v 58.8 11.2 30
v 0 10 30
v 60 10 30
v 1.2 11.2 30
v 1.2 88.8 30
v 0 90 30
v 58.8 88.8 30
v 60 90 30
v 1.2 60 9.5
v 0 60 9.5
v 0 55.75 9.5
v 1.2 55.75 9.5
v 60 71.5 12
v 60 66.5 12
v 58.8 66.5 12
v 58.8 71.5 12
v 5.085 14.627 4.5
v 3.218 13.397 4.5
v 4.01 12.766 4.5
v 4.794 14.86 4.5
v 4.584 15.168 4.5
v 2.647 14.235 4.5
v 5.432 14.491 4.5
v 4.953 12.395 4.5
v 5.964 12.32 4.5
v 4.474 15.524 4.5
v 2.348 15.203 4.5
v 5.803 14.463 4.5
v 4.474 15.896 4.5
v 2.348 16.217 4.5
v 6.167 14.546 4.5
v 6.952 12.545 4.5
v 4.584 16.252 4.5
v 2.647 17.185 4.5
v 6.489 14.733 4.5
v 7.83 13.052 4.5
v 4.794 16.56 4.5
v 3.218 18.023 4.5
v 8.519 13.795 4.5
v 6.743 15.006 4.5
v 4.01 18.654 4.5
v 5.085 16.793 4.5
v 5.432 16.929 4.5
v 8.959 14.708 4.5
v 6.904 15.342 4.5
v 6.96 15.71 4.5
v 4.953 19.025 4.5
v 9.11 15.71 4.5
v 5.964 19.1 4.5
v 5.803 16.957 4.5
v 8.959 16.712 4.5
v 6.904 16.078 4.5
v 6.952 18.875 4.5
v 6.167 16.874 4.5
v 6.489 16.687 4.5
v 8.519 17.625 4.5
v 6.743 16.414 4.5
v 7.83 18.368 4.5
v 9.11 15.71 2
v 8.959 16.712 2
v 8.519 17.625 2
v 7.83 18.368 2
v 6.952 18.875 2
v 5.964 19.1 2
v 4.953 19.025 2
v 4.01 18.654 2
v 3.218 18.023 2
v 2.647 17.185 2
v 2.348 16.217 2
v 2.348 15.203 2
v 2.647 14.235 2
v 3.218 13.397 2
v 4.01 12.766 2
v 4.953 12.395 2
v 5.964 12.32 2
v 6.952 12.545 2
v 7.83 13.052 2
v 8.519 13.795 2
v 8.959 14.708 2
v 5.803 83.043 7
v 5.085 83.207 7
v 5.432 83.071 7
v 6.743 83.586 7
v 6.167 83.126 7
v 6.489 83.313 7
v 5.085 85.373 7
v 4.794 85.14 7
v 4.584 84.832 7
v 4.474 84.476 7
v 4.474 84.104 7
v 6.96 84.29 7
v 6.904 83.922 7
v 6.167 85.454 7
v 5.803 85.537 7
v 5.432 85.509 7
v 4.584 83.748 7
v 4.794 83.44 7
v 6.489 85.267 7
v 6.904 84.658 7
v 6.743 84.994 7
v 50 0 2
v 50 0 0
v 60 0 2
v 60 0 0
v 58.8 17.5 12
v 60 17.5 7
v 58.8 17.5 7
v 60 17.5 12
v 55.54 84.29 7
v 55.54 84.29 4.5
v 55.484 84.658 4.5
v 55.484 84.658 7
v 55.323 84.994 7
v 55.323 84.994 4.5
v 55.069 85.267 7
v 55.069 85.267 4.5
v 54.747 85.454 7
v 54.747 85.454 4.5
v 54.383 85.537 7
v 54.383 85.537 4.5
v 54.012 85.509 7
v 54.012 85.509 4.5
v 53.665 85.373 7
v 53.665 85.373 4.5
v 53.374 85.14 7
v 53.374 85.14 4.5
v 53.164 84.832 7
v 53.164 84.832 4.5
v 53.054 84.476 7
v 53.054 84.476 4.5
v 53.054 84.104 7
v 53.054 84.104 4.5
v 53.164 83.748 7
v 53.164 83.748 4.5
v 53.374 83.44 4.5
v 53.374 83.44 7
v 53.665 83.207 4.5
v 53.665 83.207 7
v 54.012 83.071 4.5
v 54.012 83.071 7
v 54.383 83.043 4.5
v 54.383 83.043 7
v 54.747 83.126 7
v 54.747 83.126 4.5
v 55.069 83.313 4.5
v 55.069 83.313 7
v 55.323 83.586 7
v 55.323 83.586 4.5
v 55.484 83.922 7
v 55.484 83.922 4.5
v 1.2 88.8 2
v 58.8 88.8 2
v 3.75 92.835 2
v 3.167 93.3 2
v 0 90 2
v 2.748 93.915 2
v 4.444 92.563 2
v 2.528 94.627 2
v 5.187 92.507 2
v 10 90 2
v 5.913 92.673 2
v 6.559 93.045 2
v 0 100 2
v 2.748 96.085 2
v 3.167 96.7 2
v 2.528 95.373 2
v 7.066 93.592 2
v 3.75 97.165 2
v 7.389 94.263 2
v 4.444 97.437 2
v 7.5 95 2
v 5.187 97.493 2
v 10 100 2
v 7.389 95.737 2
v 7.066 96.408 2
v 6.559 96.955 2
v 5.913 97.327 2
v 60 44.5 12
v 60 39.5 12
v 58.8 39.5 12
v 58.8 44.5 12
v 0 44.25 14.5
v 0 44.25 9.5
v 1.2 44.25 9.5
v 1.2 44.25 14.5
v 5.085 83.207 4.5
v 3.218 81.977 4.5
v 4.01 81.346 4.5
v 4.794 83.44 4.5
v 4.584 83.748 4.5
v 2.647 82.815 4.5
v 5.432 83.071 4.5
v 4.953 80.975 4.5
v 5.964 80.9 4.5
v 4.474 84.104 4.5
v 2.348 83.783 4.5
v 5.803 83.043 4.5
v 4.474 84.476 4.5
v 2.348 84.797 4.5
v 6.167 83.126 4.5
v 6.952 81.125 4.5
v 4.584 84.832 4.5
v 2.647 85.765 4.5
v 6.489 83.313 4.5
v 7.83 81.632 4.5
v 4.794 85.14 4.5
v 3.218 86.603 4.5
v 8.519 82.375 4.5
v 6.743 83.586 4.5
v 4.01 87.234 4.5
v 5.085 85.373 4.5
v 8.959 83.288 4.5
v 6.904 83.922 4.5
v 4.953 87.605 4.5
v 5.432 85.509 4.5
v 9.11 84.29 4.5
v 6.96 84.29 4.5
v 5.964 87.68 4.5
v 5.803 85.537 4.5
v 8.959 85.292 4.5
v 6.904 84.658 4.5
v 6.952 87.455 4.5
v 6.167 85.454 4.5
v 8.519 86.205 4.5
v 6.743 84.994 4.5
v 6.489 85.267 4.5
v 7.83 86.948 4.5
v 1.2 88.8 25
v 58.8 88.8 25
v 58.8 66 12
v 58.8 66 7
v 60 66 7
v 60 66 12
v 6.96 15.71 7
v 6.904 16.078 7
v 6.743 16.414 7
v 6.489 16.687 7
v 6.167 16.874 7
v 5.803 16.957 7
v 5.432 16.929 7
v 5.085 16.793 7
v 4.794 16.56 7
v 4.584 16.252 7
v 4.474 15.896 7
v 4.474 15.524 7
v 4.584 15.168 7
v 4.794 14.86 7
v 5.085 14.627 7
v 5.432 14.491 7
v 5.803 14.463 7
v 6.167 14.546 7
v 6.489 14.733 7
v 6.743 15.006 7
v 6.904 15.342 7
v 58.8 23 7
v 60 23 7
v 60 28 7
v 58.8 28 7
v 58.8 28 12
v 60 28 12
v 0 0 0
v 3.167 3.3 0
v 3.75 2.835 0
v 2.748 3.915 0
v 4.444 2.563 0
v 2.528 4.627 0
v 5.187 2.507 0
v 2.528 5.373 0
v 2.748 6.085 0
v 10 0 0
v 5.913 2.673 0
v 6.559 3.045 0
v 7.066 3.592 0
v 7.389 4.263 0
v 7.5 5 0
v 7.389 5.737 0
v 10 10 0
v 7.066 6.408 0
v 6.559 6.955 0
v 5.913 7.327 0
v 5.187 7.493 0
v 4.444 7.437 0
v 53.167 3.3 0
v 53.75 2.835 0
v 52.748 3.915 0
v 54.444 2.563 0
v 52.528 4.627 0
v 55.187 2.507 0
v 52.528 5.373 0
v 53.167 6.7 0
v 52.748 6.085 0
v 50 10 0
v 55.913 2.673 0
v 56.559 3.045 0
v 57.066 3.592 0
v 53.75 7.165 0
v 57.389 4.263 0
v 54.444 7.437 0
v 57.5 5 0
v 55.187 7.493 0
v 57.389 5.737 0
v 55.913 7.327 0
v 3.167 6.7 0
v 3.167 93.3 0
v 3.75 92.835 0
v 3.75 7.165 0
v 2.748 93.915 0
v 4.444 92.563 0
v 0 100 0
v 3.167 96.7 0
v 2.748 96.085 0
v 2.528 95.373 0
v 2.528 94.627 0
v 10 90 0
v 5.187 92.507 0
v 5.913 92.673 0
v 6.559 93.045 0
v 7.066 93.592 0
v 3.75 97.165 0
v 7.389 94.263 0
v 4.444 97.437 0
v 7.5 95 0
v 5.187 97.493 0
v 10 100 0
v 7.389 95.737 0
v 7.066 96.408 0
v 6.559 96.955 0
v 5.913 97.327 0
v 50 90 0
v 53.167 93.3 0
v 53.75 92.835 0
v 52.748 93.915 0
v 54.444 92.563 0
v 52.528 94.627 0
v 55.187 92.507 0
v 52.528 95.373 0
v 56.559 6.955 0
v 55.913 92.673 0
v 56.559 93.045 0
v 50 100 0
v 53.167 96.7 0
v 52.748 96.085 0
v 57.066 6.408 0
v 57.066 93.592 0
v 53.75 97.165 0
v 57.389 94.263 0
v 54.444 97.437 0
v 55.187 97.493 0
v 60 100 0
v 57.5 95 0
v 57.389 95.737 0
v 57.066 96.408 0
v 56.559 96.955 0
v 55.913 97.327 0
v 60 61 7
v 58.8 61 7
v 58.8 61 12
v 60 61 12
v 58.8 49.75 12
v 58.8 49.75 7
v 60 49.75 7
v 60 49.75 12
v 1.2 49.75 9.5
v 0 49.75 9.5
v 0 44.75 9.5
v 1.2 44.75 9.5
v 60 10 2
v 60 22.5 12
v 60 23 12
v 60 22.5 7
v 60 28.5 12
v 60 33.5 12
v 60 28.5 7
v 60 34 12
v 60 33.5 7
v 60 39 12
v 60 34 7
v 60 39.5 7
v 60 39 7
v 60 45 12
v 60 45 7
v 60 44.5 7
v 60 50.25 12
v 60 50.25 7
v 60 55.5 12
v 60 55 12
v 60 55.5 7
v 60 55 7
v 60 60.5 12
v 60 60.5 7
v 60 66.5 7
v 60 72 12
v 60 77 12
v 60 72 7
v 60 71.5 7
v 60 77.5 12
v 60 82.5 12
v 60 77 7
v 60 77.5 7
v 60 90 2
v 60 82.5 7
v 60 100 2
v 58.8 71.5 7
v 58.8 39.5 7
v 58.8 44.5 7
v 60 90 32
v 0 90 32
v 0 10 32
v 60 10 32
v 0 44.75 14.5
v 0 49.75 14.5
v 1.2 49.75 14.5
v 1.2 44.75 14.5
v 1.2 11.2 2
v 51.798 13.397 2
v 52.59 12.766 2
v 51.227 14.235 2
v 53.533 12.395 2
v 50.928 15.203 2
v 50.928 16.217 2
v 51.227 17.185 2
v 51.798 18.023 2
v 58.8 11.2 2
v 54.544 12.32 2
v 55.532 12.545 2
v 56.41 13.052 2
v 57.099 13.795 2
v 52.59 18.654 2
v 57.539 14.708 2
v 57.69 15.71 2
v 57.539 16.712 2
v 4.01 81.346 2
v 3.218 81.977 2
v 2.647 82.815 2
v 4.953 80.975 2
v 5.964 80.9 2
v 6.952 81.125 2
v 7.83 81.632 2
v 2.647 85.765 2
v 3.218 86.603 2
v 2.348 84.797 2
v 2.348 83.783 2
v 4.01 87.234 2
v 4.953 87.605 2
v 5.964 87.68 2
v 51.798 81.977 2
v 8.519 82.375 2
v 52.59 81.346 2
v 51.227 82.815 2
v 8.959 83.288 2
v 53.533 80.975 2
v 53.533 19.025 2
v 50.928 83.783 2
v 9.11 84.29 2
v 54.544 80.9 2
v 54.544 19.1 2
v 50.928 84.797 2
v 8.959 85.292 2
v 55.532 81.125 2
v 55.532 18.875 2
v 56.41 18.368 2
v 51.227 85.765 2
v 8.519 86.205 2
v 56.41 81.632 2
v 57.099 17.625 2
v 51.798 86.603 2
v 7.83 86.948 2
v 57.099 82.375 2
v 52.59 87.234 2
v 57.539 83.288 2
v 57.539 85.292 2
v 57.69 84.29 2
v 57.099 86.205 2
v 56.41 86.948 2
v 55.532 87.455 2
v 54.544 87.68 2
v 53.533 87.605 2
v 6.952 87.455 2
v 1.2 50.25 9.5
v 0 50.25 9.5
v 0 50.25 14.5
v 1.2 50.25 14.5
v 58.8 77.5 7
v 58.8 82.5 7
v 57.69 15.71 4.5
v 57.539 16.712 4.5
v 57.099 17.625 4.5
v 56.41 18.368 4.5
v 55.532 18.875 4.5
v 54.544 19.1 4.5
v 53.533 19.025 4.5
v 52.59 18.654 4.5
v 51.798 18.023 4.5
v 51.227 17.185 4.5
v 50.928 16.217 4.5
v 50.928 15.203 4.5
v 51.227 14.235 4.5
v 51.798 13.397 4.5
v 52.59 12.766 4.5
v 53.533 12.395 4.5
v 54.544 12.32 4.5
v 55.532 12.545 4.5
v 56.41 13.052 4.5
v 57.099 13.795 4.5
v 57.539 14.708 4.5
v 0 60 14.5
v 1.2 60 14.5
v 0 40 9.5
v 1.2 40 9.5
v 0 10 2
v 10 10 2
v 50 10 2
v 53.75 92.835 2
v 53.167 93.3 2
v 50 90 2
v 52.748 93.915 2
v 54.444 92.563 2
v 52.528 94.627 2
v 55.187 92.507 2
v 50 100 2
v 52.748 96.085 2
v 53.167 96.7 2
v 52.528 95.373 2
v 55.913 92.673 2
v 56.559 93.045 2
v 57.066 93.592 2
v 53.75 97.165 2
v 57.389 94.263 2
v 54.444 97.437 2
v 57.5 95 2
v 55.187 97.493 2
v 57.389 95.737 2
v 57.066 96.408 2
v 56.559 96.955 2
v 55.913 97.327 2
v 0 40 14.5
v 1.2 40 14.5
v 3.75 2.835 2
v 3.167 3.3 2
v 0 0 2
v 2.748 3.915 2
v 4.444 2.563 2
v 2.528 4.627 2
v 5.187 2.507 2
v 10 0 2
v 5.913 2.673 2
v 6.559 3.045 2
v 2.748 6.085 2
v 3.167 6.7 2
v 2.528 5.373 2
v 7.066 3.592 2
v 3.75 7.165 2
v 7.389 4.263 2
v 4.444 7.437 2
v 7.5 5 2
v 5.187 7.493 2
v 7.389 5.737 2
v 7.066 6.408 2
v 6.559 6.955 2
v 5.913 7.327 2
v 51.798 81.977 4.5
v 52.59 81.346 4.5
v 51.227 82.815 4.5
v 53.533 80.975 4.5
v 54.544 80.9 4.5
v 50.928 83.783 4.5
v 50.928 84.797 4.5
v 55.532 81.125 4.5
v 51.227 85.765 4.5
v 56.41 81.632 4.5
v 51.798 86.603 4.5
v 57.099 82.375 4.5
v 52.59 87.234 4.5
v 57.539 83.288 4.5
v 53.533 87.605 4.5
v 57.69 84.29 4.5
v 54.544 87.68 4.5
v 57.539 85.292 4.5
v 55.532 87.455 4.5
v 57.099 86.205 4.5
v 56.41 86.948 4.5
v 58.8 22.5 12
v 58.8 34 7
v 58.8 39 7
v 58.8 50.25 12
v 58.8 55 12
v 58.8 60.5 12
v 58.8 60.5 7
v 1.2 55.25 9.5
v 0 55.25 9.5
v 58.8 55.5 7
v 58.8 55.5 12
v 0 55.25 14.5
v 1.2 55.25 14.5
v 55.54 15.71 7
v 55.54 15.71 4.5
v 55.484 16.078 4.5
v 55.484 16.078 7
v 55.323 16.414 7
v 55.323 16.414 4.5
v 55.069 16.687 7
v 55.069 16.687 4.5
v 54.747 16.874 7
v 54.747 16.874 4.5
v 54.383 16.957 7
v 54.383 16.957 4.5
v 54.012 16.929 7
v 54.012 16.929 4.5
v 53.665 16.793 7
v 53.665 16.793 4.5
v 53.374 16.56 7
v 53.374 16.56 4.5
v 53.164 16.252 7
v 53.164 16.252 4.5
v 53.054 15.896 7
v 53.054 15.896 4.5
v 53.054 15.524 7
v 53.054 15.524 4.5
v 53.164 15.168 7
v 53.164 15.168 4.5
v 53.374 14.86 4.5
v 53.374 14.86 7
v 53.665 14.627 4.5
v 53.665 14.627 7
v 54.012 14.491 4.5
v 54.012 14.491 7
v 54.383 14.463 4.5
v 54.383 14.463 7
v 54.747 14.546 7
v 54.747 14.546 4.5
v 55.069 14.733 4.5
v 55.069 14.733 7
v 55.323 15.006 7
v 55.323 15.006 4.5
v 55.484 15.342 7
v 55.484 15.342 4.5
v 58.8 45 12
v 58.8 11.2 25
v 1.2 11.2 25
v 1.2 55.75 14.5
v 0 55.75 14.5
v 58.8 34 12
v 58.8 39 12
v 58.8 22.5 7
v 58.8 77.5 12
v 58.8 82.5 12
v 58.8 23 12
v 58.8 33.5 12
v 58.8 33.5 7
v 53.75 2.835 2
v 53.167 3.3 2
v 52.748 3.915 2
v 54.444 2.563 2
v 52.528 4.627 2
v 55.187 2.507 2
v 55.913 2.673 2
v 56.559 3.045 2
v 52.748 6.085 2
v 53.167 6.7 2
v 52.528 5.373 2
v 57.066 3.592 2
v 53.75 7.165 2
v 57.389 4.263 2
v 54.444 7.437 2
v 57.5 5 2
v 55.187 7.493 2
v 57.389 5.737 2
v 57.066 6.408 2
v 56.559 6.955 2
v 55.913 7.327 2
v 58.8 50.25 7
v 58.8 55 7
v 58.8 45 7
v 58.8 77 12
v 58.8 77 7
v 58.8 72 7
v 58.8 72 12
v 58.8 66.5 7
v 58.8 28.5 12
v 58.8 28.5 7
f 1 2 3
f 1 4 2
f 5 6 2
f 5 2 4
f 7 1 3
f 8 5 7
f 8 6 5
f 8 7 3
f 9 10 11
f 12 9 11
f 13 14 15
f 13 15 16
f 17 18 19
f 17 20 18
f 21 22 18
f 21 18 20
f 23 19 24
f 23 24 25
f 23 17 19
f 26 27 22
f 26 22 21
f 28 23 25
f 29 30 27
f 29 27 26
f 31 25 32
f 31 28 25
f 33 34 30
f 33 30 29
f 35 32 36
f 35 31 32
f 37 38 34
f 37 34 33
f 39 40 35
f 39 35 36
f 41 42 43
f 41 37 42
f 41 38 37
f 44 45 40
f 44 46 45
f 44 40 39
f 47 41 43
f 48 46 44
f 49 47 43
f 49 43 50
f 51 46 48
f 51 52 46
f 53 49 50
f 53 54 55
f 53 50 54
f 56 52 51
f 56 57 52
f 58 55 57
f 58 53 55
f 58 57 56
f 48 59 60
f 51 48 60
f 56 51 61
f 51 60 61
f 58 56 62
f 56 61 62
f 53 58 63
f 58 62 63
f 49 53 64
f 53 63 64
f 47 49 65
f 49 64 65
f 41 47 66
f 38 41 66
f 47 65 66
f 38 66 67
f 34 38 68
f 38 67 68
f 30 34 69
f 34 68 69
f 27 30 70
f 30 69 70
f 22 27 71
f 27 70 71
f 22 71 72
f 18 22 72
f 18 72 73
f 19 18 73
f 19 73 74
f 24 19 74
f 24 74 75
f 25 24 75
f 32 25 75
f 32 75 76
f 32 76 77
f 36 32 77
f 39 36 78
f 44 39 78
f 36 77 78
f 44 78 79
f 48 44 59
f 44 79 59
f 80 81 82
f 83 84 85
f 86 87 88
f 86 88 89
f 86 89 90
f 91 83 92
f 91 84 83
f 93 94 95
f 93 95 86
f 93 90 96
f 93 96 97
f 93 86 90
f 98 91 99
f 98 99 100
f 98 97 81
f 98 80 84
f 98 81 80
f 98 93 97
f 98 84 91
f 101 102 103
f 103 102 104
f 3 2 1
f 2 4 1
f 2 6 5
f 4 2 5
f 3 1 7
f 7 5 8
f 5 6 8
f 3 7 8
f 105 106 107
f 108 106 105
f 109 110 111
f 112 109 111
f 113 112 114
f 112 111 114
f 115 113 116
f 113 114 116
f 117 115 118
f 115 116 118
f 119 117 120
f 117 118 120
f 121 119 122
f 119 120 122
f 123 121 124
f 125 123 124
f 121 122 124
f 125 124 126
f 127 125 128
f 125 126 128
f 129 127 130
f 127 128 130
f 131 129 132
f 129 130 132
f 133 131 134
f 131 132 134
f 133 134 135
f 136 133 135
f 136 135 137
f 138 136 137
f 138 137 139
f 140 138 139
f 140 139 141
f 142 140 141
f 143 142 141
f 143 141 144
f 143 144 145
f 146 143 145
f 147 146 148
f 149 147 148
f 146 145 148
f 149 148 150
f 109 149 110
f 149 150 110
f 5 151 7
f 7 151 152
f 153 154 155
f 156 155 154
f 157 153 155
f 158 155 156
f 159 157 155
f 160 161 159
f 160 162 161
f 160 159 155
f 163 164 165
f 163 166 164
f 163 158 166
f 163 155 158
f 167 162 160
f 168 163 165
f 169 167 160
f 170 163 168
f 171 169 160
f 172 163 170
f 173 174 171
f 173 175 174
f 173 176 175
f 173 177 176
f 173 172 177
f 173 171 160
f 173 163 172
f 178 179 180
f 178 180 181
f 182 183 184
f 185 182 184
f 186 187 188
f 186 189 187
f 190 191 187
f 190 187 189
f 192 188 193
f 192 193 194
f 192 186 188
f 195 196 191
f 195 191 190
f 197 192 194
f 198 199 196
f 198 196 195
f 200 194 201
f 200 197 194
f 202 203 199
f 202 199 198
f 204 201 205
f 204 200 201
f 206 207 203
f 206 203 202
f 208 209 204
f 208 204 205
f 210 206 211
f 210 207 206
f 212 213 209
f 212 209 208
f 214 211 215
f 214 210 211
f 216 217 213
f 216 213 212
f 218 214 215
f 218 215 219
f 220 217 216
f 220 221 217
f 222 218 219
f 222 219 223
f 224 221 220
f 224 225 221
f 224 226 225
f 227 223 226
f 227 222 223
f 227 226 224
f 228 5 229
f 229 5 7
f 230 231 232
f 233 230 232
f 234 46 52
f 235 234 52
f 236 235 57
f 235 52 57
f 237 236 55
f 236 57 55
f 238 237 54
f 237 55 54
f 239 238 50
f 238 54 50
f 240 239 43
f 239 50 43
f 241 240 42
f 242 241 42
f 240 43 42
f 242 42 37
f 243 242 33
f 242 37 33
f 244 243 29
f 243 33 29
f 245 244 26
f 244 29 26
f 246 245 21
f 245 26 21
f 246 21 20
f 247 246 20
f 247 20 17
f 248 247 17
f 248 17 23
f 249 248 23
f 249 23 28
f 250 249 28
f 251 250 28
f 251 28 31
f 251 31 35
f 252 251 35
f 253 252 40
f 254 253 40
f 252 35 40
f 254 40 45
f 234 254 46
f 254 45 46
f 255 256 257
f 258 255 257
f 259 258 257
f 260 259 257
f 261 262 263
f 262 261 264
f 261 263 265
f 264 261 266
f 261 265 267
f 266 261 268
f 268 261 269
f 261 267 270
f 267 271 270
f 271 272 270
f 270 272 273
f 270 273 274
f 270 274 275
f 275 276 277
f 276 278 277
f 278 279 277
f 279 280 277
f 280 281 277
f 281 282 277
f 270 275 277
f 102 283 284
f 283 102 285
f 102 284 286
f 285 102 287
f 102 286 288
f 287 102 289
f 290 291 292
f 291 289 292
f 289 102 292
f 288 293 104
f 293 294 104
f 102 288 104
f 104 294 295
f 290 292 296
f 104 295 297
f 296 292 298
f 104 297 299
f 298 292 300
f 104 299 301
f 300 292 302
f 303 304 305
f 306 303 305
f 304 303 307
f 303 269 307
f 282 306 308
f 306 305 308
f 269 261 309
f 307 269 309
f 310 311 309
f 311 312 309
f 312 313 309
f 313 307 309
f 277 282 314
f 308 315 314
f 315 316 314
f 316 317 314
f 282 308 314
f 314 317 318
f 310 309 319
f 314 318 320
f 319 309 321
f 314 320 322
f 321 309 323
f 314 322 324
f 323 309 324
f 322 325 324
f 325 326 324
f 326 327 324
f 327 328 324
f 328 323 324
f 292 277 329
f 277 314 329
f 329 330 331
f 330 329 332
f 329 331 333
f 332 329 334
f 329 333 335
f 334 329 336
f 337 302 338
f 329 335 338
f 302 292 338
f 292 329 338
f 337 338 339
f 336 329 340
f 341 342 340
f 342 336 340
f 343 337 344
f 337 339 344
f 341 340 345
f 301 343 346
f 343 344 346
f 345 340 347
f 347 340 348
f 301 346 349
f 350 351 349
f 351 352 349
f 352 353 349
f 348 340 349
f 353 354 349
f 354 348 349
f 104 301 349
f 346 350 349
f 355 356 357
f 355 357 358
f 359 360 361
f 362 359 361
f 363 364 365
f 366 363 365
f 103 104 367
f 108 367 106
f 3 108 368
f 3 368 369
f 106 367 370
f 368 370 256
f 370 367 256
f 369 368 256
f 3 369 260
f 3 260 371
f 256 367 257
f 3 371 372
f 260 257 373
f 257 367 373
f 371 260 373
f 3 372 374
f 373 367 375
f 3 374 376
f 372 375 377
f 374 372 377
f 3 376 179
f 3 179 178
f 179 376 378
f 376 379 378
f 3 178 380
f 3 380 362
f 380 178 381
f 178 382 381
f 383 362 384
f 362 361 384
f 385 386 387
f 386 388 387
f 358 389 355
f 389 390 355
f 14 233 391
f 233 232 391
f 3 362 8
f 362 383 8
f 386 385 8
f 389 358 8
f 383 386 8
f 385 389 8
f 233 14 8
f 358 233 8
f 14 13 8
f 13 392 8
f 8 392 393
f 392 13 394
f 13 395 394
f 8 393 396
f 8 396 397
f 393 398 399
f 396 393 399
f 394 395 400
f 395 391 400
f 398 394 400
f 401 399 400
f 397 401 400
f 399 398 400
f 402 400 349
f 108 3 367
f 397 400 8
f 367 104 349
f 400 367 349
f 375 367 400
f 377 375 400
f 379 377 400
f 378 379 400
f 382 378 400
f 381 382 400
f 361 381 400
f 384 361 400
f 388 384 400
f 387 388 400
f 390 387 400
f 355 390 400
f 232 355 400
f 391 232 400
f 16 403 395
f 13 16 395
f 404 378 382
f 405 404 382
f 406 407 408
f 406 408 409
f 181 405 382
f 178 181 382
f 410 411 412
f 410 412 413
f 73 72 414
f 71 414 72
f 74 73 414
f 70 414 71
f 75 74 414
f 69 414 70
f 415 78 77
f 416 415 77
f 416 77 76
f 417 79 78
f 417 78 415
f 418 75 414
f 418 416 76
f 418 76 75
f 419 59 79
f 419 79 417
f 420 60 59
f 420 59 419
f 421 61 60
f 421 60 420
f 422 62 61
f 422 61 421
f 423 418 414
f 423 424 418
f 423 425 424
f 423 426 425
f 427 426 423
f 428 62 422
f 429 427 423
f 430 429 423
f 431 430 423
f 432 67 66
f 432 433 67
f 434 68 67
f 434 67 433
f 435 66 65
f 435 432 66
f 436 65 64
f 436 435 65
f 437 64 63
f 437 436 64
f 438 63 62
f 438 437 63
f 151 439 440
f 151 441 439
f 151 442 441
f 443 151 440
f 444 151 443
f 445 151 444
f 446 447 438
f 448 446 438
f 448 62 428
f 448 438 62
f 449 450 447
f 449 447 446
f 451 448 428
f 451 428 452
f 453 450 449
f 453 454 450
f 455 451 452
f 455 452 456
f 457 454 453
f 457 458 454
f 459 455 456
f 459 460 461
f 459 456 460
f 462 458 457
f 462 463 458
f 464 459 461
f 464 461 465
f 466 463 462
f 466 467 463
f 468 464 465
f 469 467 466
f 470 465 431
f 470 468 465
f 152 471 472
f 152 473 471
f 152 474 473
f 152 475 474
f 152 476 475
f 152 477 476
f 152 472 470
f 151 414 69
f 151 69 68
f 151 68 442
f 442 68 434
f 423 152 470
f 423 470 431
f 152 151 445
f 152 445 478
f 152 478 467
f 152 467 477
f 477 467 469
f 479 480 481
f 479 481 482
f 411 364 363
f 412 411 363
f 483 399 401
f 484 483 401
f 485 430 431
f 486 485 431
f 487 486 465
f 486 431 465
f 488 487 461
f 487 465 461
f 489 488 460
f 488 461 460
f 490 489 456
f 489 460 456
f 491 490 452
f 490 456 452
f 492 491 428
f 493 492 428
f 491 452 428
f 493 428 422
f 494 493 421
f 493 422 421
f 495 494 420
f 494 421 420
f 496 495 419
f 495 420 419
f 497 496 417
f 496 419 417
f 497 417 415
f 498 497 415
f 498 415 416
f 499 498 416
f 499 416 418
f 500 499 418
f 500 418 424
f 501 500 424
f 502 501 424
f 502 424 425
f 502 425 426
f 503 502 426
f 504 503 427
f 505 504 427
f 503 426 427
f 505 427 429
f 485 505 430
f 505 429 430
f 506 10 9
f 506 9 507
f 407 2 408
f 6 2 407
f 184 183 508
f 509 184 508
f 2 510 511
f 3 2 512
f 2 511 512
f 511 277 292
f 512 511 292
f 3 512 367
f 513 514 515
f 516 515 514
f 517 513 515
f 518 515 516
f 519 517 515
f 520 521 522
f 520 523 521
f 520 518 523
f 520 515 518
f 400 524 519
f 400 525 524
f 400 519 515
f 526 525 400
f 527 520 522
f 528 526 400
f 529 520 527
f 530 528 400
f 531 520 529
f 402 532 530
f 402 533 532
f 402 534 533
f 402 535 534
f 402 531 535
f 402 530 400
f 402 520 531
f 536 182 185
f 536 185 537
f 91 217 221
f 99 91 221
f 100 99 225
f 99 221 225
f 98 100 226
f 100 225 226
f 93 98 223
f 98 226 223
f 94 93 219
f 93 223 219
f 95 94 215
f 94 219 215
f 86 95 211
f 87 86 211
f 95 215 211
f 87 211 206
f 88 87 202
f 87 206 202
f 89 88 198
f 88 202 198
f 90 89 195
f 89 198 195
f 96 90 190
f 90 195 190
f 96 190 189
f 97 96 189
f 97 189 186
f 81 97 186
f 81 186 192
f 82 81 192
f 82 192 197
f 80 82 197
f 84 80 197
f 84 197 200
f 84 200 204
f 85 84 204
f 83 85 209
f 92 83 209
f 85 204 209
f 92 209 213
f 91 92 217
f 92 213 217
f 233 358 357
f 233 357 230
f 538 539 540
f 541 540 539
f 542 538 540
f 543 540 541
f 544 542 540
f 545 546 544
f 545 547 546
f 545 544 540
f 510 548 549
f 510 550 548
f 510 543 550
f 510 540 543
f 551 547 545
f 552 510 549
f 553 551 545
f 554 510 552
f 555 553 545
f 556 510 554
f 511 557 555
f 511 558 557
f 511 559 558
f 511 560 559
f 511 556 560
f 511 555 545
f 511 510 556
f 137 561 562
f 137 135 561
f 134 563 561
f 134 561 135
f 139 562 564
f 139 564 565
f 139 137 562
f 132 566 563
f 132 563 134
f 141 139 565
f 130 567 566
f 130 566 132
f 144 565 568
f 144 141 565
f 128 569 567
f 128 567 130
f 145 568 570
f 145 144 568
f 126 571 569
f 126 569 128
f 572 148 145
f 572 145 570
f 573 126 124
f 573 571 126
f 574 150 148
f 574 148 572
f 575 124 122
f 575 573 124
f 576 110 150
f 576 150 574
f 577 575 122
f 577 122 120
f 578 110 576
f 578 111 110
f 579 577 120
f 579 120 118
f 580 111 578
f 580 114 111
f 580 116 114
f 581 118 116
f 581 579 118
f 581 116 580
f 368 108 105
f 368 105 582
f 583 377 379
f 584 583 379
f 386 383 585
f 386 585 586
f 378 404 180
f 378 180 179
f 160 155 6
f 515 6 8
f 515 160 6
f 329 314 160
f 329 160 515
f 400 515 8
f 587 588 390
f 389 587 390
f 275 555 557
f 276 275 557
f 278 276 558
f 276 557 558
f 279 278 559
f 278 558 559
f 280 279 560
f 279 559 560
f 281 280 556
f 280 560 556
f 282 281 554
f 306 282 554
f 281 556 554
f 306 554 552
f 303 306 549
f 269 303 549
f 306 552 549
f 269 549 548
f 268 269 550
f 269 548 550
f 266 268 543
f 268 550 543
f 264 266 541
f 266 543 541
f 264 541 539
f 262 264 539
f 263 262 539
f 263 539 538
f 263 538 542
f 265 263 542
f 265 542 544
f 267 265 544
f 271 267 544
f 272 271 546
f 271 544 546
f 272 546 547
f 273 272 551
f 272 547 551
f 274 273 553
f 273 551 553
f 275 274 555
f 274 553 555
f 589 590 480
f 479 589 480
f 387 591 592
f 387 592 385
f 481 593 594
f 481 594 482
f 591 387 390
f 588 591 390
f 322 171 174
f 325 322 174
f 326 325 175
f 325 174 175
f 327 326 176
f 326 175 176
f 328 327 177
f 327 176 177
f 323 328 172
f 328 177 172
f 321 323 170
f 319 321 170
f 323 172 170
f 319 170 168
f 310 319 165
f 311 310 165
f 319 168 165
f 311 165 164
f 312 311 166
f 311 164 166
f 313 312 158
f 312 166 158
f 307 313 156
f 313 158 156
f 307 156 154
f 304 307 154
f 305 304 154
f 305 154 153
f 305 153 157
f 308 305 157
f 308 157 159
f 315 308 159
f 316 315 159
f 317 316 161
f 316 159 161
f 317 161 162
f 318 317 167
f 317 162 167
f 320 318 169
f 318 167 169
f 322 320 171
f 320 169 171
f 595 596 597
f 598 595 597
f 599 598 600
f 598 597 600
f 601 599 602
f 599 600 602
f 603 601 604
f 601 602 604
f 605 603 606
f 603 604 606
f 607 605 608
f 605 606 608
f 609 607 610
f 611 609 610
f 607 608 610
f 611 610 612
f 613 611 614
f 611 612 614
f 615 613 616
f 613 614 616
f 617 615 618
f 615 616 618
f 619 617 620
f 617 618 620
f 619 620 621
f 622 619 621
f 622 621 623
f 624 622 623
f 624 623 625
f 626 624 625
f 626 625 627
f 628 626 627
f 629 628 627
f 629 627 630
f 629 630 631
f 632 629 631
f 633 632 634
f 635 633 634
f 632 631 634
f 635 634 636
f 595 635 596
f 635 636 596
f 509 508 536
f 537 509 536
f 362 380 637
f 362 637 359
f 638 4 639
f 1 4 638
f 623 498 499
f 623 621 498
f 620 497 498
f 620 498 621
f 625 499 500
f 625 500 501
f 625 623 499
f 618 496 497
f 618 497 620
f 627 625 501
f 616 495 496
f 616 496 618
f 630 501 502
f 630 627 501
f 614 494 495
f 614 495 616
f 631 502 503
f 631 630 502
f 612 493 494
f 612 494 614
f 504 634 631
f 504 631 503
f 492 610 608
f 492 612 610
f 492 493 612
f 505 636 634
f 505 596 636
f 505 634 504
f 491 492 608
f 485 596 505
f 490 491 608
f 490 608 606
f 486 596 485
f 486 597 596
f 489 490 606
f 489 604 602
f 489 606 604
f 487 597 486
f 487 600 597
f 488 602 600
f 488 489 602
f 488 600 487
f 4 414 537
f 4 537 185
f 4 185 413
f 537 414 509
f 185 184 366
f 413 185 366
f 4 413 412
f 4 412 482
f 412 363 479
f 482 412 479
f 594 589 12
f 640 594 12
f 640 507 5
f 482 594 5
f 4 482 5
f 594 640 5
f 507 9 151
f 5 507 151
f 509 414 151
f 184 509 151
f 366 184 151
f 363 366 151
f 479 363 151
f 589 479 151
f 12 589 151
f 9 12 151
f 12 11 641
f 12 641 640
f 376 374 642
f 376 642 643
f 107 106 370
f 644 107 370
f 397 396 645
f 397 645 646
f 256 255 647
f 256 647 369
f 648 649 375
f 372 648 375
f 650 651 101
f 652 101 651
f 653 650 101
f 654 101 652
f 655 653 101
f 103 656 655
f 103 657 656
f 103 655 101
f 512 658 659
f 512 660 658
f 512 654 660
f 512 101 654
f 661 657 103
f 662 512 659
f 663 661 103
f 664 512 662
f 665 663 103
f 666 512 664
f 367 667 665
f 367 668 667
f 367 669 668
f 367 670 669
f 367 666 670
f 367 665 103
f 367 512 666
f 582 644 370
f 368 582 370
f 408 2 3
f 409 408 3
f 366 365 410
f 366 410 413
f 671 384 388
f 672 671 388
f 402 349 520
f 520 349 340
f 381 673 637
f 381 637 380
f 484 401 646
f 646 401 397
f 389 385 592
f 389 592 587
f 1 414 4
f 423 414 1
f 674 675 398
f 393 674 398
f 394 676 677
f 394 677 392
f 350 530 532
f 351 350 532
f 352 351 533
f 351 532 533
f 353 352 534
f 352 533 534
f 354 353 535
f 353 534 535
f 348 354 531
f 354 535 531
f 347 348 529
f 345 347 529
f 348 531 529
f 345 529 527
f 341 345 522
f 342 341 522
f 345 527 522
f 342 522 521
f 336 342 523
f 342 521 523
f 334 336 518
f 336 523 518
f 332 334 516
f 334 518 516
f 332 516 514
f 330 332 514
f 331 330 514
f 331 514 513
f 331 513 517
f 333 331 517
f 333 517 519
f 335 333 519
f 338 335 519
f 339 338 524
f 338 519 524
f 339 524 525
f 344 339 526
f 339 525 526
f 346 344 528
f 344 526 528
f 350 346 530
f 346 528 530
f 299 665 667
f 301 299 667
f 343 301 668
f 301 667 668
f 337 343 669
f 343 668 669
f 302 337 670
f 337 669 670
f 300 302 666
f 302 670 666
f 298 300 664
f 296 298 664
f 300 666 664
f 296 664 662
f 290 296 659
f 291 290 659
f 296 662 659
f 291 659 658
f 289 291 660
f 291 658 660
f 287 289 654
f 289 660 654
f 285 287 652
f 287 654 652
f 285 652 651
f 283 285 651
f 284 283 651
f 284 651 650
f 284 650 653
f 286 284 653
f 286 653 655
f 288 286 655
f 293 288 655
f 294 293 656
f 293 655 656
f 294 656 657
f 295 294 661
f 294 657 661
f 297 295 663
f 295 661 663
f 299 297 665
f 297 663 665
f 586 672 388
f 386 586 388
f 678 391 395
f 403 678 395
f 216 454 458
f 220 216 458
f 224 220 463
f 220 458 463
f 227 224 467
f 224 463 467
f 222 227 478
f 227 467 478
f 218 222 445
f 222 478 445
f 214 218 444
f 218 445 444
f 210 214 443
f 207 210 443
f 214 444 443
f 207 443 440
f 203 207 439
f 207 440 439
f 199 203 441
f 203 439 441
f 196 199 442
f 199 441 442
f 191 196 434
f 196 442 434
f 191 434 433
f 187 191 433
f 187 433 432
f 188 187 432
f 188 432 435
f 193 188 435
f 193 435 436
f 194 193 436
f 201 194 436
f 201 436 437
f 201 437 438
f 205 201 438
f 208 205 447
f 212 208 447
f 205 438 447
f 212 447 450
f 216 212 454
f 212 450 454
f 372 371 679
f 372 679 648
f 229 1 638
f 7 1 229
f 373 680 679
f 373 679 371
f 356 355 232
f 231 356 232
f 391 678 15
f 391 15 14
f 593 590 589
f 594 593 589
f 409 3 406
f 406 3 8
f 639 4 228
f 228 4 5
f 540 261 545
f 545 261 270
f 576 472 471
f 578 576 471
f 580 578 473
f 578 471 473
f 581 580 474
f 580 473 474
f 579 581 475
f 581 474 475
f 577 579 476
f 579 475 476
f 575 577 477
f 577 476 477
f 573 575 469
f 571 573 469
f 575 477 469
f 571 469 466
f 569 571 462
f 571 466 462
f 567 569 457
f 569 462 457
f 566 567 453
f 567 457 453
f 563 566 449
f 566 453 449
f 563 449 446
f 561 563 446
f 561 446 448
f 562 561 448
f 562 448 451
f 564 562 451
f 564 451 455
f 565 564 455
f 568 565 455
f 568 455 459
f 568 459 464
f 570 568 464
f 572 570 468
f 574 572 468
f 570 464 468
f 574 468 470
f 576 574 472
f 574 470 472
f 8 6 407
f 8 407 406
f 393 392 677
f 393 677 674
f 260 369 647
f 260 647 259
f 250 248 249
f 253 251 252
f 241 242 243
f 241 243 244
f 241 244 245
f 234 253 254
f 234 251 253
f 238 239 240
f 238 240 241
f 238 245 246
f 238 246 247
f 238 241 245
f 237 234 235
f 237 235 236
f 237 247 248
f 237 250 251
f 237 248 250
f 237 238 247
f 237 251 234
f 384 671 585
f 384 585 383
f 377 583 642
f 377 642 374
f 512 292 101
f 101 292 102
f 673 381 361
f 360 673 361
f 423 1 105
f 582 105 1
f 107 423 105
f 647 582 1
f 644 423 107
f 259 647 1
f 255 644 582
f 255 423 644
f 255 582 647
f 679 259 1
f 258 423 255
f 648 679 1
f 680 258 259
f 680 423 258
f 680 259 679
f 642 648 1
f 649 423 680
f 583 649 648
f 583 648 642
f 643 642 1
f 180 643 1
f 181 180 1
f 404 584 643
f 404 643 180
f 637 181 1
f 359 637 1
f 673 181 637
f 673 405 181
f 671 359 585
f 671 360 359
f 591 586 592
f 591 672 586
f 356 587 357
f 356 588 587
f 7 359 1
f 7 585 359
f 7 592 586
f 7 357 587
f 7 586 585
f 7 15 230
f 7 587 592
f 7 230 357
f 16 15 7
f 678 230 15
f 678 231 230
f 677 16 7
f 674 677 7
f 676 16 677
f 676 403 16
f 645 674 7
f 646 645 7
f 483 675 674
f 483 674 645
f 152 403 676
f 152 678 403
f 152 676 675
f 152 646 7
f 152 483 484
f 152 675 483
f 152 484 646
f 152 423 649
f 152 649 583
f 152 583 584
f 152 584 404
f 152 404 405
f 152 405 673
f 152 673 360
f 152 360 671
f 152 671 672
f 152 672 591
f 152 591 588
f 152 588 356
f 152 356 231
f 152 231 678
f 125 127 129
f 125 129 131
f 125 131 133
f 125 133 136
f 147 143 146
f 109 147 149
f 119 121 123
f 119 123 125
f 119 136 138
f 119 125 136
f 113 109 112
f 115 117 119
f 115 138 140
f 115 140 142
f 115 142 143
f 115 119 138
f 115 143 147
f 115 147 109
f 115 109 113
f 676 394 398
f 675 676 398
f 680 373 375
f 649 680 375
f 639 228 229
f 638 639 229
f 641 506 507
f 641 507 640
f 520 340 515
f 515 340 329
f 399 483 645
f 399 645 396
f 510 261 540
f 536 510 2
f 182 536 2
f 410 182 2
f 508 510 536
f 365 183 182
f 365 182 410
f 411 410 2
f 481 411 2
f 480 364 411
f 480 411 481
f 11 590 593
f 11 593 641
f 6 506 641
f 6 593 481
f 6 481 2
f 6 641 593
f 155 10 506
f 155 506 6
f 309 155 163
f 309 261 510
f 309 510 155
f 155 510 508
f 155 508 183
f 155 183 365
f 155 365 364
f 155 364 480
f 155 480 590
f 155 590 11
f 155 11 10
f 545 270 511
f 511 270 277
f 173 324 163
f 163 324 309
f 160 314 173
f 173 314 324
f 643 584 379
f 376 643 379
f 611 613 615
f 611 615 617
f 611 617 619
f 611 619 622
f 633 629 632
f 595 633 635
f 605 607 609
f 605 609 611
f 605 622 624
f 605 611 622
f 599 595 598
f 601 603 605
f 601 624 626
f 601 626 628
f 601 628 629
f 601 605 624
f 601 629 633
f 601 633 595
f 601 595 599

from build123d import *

# Parameters (mm, degrees)
F1_DEPTH  = 2
F2_W      = 60
F2_H      = 80
F2_W_2    = 57.6
F2_H_2    = 77.6
F3_DEPTH  = 28
F7_R      = 2.5
F6_R      = 2.5
F5_R      = 2.5
F4_R      = 2.5
F8_DEPTH  = 2
F9_R      = 3.4
F10_DEPTH = 2.5
F14_R     = 1.25
F13_R     = 1.25
F11_R     = 1.25
F12_R     = 1.25
F15_DEPTH = 2.5
F16_W     = 65
F16_H     = 5
F17_DEPTH = 1.2
F18_W     = 1.2
F18_H     = 0.5
F19_DEPTH = 5
F20_W     = 20
F20_H     = 5
F21_DEPTH = 1.2
F22_W     = 60
F22_H     = 80
F23_DEPTH = 2
F24_W     = 57.6
F24_H     = 77.6
F25_DEPTH = 5
F26_W     = 1.2
F26_H     = 0.5
F27_DEPTH = 5


with BuildPart() as f1:
    # F0 (on Top) → F1 (new body)
    with BuildSketch(Plane.XY):
        Polygon((0, 100), (0, 0), (10, 0), (10, 10), (50, 10), (50, 0), (60, 0), (60, 100), (50, 100), (50, 90), (10, 90), (10, 100), align=None)
    extrude(amount=F1_DEPTH)

    # F2 (on face) → F3 (join)
    with BuildSketch(Plane.XY.offset(2)):
        with Locations((30, 50)):
            Rectangle(F2_W, F2_H)
        with Locations((30, 50)):
            Rectangle(F2_W_2, F2_H_2, mode=Mode.SUBTRACT)
    extrude(amount=F3_DEPTH)

    # F7 (on face) + F6 (on face) + F5 (on face) + F4 (on face) → F8 (cut, through all)
    with BuildSketch(Plane.XY.offset(2)):
        with Locations((5, 95)):
            Circle(F7_R)
    with BuildSketch(Plane.XY.offset(2)):
        with Locations((55, 95)):
            Circle(F6_R)
    with BuildSketch(Plane.XY.offset(2)):
        with Locations((55, 5)):
            Circle(F5_R)
    with BuildSketch(Plane.XY.offset(2)):
        with Locations((5, 5)):
            Circle(F4_R)
    extrude(amount=-F8_DEPTH, mode=Mode.SUBTRACT)

    # F9 (on face) → F10 (join)
    with BuildSketch(Plane.XY.offset(2)):
        with Locations((5.71, 15.71)):
            Circle(F9_R)
        with Locations((5.71, 84.29)):
            Circle(F9_R)
        with Locations((54.29, 15.71)):
            Circle(F9_R)
        with Locations((54.29, 84.29)):
            Circle(F9_R)
    extrude(amount=F10_DEPTH)

    # F14 (on face) + F13 (on face) + F11 (on face) + F12 (on face) → F15 (join)
    with BuildSketch(Plane.XY.offset(4.5)):
        with Locations((5.71, 84.29)):
            Circle(F14_R)
    with BuildSketch(Plane.XY.offset(4.5)):
        with Locations((54.29, 84.29)):
            Circle(F13_R)
    with BuildSketch(Plane.XY.offset(4.5)):
        with Locations((5.71, 15.71)):
            Circle(F11_R)
    with BuildSketch(Plane.XY.offset(4.5)):
        with Locations((54.29, 15.71)):
            Circle(F12_R)
    extrude(amount=F15_DEPTH)

    # F16 (on face) → F17 (cut, through all)
    with BuildSketch(Plane.YZ.offset(60)):
        with Locations((50, 9.5)):
            Rectangle(F16_W, F16_H)
    extrude(amount=-F17_DEPTH, mode=Mode.SUBTRACT)

    # F18 (on face) → F19 (join, through all)
    with BuildSketch(Plane.XY.offset(7)):
        with Locations((59.4, 50)):
            Rectangle(F18_W, F18_H)
        with Locations((59.4, 44.75)):
            Rectangle(F18_W, F18_H)
        with Locations((59.4, 39.25)):
            Rectangle(F18_W, F18_H)
        with Locations((59.4, 33.75)):
            Rectangle(F18_W, F18_H)
        with Locations((59.4, 28.25)):
            Rectangle(F18_W, F18_H)
        with Locations((59.4, 22.75)):
            Rectangle(F18_W, F18_H)
        with Locations((59.4, 60.75)):
            Rectangle(F18_W, F18_H)
        with Locations((59.4, 55.25)):
            Rectangle(F18_W, F18_H)
        with Locations((59.4, 66.25)):
            Rectangle(F18_W, F18_H)
        with Locations((59.4, 71.75)):
            Rectangle(F18_W, F18_H)
        with Locations((59.4, 77.25)):
            Rectangle(F18_W, F18_H)
    extrude(amount=F19_DEPTH)

    # F20 (on face) → F21 (cut, through all)
    with BuildSketch(Plane(origin=(0, 0, 0), x_dir=(0, -1, 0), z_dir=(-1, 0, 0))):
        with Locations((-50, 12)):
            Rectangle(F20_W, F20_H)
    extrude(amount=-F21_DEPTH, mode=Mode.SUBTRACT)

    # F26 (on face) → F27 (join, through all)
    with BuildSketch(Plane.XY.offset(9.5)):
        with Locations((0.6, 50)):
            Rectangle(F26_W, F26_H)
        with Locations((0.6, 44.5)):
            Rectangle(F26_W, F26_H)
        with Locations((0.6, 55.5)):
            Rectangle(F26_W, F26_H)
    extrude(amount=F27_DEPTH)


with BuildPart() as f23:
    # F22 (on face) → F23 (new body)
    with BuildSketch(Plane.XY.offset(30)):
        with Locations((30, 50)):
            Rectangle(F22_W, F22_H)
    extrude(amount=F23_DEPTH)

    # F24 (on face) → F25 (join)
    with BuildSketch(Plane.XY.offset(30)):
        with Locations((30, 50)):
            Rectangle(F24_W, F24_H)
    extrude(amount=-F25_DEPTH)


solid = Compound([f1.part, f23.part])
